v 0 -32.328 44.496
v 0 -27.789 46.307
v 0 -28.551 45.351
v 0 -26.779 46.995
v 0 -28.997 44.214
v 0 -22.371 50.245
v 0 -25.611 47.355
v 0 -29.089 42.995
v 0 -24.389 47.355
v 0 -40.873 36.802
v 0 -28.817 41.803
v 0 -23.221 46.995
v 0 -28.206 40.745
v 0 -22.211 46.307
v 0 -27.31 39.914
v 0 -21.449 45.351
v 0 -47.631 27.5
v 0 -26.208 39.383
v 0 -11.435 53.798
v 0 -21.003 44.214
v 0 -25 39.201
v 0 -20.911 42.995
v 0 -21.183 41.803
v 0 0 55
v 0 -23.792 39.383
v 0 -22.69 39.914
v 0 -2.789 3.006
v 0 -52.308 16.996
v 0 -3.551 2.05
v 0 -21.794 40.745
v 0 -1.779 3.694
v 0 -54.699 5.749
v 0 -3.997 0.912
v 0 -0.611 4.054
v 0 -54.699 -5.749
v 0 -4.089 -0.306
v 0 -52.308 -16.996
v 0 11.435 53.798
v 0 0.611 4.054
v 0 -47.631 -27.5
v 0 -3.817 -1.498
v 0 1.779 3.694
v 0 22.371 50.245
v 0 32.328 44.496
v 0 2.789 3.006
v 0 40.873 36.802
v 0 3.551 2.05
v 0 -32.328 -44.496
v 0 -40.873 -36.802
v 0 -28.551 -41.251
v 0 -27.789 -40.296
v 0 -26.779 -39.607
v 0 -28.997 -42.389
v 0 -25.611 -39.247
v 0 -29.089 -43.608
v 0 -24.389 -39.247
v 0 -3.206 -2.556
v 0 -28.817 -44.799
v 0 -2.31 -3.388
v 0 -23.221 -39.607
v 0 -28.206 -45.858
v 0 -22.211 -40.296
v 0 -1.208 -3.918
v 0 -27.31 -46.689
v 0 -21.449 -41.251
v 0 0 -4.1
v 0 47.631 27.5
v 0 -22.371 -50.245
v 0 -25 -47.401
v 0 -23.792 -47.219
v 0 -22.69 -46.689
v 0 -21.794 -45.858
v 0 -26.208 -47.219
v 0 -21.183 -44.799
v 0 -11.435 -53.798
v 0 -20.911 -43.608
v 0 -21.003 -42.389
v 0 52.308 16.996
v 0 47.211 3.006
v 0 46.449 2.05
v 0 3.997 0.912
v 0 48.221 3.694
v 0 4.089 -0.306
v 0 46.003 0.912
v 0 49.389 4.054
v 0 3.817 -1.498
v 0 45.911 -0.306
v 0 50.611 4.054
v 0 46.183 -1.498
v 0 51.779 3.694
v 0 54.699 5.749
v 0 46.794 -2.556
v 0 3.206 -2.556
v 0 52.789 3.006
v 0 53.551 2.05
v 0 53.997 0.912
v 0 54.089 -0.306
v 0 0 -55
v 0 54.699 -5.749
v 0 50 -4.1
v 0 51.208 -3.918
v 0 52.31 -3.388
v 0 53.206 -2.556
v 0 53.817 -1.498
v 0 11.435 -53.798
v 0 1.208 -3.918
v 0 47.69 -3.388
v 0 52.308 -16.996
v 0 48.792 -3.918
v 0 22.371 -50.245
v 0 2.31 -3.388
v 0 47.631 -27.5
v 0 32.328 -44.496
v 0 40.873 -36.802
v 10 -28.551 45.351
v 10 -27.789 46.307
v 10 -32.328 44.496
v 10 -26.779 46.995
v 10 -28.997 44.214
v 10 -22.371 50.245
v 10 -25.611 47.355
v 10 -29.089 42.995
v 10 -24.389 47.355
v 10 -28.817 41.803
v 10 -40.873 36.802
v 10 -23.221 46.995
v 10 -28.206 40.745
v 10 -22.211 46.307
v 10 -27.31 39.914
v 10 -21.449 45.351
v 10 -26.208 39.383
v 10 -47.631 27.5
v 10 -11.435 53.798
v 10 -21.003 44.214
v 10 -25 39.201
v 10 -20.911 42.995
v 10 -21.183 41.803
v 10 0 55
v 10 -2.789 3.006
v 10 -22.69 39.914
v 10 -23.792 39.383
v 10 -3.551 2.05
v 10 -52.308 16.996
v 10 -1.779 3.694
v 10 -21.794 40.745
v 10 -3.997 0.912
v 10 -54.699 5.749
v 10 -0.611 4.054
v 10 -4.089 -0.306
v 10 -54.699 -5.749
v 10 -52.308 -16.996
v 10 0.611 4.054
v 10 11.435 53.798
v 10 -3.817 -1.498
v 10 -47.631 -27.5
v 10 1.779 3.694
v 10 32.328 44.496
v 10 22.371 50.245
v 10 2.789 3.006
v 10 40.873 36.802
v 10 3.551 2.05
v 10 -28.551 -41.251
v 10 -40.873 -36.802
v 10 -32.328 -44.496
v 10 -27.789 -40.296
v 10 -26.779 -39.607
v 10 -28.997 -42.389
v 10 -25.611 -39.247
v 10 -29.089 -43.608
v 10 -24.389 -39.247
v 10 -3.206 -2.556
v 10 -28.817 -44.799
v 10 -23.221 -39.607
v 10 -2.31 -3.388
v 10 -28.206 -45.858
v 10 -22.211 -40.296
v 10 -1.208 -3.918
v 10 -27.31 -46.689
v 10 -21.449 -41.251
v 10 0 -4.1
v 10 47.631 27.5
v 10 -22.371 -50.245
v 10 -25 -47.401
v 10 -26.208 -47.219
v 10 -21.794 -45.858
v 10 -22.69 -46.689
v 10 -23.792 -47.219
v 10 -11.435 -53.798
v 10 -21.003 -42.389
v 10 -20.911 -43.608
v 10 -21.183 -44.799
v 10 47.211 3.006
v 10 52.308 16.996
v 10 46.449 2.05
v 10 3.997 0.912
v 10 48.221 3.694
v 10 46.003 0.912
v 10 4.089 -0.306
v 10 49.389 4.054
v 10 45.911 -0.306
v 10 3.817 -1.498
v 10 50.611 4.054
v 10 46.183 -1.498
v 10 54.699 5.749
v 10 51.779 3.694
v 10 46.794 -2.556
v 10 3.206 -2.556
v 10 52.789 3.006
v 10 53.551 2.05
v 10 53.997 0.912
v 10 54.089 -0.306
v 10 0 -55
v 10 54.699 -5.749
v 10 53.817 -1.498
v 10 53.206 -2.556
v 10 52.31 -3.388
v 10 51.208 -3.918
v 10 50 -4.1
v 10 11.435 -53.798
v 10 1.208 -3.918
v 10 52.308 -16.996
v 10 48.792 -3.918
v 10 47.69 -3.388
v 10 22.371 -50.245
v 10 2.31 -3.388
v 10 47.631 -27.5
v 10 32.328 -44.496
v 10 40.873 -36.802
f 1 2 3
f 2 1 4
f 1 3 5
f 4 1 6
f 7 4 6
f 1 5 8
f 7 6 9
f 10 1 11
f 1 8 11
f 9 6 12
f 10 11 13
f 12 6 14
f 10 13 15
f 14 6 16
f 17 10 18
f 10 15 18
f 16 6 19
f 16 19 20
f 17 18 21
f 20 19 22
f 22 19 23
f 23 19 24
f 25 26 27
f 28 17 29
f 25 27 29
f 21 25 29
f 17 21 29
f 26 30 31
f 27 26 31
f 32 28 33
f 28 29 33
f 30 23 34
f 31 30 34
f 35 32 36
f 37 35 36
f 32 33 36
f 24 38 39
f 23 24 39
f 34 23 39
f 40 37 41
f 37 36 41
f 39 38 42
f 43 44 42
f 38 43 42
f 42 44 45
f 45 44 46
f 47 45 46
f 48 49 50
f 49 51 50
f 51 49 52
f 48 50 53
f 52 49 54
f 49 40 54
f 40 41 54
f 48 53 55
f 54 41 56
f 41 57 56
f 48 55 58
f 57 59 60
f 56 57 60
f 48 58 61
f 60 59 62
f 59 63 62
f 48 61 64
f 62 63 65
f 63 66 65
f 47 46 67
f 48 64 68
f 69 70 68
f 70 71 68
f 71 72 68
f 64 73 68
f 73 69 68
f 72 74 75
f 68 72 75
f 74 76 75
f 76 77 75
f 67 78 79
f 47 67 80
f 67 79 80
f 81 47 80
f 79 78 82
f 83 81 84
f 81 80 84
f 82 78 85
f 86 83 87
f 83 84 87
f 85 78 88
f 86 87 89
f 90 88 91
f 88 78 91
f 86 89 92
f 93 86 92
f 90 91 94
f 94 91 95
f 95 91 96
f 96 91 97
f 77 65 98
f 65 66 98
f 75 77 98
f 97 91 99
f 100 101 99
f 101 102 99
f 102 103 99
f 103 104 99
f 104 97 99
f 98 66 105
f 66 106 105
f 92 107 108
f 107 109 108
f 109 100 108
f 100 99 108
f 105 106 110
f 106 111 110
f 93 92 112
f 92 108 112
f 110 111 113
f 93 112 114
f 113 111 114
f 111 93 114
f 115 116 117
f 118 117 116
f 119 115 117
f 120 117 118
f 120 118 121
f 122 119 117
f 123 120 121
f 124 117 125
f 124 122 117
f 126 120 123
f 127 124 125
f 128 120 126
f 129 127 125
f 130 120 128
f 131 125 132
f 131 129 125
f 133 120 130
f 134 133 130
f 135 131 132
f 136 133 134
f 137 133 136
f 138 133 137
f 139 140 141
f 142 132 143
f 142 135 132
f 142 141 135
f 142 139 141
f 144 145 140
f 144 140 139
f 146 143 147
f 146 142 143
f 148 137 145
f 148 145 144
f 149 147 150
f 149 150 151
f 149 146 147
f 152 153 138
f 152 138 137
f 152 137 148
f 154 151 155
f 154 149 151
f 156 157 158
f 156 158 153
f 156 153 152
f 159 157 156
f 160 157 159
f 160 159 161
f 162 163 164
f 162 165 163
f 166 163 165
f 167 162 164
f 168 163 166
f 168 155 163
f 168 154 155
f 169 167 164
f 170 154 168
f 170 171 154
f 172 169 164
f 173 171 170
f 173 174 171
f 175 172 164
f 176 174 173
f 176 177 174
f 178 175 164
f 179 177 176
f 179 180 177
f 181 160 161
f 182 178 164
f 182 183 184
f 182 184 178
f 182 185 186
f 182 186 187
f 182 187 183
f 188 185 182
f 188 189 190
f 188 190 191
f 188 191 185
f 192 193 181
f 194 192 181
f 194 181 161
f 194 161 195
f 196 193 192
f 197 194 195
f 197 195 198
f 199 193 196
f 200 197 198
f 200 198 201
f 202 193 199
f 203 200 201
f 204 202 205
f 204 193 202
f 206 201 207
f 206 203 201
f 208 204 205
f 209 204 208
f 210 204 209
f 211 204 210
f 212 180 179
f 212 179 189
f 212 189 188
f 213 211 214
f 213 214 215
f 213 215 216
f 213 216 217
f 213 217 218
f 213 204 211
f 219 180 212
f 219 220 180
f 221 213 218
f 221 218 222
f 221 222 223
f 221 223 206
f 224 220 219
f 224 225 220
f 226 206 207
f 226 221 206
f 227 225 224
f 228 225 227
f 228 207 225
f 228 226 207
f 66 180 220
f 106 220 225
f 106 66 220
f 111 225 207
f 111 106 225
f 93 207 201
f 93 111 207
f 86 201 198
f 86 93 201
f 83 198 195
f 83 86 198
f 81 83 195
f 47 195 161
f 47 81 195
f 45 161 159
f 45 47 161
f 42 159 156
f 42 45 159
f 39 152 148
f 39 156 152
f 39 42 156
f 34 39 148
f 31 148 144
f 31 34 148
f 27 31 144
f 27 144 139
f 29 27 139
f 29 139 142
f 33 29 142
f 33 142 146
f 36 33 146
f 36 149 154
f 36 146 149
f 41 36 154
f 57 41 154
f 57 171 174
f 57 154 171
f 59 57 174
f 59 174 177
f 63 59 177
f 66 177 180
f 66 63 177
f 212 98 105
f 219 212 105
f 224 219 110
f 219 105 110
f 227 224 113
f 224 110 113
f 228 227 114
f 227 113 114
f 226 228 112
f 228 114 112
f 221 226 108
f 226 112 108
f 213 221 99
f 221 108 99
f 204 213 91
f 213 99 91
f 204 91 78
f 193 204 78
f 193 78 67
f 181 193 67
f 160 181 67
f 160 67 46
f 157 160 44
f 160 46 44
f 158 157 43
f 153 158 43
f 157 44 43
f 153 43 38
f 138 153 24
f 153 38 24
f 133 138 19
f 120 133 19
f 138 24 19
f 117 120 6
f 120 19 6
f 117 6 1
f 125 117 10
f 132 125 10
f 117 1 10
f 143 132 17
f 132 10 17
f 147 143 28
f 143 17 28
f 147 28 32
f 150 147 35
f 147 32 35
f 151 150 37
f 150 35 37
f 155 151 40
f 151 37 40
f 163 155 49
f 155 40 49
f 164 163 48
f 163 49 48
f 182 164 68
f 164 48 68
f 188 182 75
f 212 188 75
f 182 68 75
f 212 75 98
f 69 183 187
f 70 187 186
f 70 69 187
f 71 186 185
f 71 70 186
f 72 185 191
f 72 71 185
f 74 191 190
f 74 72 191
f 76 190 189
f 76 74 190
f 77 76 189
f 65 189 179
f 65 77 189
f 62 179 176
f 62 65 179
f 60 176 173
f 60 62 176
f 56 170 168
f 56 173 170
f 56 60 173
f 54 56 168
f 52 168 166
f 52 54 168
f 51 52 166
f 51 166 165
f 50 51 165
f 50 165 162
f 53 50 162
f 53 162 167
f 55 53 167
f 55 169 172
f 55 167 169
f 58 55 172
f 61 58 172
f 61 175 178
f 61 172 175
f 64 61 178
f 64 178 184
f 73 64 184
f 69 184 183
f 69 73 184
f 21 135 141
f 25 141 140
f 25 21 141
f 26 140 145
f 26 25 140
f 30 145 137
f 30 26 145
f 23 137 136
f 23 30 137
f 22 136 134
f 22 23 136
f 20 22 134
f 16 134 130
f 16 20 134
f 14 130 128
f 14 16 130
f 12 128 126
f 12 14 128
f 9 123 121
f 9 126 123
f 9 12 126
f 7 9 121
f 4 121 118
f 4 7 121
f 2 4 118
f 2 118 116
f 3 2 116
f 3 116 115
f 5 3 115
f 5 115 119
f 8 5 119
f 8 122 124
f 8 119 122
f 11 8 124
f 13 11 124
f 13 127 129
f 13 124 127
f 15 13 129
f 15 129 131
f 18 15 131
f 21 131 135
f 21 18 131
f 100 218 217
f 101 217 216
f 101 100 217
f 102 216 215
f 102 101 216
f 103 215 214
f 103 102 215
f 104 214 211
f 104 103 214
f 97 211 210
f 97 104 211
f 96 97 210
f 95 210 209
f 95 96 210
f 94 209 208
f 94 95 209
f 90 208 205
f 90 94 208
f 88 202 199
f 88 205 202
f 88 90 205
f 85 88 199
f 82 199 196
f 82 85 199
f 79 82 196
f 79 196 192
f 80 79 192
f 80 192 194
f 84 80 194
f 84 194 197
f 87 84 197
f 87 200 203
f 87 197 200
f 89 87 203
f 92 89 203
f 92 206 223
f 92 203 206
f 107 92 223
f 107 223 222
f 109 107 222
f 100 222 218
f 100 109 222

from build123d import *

# Parameters (mm, degrees)
SKETCH1_R           = 55
BOSS_EXTRUDE1_DEPTH = 10
SKETCH2_R           = 4.1
CUT_EXTRUDE1_DEPTH  = 79.421935707


with BuildPart() as part:
    # Sketch1 → Boss-Extrude1 (new body)
    with BuildSketch(Plane(origin=(0, 0, 0), x_dir=(0, 0, -1), z_dir=(1, 0, 0))):
        Circle(SKETCH1_R)
    extrude(amount=BOSS_EXTRUDE1_DEPTH)

    # Sketch2 → Cut-Extrude1 (cut, through all)
    with BuildSketch(Plane(origin=(0, 0, 0), x_dir=(0, 0, -1), z_dir=(1, 0, 0))):
        Circle(SKETCH2_R)
        with Locations((0, 50)):
            Circle(SKETCH2_R)
        with Locations((43.301270189, -25)):
            Circle(SKETCH2_R)
        with Locations((-43.301270189, -25)):
            Circle(SKETCH2_R)
    extrude(amount=CUT_EXTRUDE1_DEPTH, mode=Mode.SUBTRACT)


solid = part.part
